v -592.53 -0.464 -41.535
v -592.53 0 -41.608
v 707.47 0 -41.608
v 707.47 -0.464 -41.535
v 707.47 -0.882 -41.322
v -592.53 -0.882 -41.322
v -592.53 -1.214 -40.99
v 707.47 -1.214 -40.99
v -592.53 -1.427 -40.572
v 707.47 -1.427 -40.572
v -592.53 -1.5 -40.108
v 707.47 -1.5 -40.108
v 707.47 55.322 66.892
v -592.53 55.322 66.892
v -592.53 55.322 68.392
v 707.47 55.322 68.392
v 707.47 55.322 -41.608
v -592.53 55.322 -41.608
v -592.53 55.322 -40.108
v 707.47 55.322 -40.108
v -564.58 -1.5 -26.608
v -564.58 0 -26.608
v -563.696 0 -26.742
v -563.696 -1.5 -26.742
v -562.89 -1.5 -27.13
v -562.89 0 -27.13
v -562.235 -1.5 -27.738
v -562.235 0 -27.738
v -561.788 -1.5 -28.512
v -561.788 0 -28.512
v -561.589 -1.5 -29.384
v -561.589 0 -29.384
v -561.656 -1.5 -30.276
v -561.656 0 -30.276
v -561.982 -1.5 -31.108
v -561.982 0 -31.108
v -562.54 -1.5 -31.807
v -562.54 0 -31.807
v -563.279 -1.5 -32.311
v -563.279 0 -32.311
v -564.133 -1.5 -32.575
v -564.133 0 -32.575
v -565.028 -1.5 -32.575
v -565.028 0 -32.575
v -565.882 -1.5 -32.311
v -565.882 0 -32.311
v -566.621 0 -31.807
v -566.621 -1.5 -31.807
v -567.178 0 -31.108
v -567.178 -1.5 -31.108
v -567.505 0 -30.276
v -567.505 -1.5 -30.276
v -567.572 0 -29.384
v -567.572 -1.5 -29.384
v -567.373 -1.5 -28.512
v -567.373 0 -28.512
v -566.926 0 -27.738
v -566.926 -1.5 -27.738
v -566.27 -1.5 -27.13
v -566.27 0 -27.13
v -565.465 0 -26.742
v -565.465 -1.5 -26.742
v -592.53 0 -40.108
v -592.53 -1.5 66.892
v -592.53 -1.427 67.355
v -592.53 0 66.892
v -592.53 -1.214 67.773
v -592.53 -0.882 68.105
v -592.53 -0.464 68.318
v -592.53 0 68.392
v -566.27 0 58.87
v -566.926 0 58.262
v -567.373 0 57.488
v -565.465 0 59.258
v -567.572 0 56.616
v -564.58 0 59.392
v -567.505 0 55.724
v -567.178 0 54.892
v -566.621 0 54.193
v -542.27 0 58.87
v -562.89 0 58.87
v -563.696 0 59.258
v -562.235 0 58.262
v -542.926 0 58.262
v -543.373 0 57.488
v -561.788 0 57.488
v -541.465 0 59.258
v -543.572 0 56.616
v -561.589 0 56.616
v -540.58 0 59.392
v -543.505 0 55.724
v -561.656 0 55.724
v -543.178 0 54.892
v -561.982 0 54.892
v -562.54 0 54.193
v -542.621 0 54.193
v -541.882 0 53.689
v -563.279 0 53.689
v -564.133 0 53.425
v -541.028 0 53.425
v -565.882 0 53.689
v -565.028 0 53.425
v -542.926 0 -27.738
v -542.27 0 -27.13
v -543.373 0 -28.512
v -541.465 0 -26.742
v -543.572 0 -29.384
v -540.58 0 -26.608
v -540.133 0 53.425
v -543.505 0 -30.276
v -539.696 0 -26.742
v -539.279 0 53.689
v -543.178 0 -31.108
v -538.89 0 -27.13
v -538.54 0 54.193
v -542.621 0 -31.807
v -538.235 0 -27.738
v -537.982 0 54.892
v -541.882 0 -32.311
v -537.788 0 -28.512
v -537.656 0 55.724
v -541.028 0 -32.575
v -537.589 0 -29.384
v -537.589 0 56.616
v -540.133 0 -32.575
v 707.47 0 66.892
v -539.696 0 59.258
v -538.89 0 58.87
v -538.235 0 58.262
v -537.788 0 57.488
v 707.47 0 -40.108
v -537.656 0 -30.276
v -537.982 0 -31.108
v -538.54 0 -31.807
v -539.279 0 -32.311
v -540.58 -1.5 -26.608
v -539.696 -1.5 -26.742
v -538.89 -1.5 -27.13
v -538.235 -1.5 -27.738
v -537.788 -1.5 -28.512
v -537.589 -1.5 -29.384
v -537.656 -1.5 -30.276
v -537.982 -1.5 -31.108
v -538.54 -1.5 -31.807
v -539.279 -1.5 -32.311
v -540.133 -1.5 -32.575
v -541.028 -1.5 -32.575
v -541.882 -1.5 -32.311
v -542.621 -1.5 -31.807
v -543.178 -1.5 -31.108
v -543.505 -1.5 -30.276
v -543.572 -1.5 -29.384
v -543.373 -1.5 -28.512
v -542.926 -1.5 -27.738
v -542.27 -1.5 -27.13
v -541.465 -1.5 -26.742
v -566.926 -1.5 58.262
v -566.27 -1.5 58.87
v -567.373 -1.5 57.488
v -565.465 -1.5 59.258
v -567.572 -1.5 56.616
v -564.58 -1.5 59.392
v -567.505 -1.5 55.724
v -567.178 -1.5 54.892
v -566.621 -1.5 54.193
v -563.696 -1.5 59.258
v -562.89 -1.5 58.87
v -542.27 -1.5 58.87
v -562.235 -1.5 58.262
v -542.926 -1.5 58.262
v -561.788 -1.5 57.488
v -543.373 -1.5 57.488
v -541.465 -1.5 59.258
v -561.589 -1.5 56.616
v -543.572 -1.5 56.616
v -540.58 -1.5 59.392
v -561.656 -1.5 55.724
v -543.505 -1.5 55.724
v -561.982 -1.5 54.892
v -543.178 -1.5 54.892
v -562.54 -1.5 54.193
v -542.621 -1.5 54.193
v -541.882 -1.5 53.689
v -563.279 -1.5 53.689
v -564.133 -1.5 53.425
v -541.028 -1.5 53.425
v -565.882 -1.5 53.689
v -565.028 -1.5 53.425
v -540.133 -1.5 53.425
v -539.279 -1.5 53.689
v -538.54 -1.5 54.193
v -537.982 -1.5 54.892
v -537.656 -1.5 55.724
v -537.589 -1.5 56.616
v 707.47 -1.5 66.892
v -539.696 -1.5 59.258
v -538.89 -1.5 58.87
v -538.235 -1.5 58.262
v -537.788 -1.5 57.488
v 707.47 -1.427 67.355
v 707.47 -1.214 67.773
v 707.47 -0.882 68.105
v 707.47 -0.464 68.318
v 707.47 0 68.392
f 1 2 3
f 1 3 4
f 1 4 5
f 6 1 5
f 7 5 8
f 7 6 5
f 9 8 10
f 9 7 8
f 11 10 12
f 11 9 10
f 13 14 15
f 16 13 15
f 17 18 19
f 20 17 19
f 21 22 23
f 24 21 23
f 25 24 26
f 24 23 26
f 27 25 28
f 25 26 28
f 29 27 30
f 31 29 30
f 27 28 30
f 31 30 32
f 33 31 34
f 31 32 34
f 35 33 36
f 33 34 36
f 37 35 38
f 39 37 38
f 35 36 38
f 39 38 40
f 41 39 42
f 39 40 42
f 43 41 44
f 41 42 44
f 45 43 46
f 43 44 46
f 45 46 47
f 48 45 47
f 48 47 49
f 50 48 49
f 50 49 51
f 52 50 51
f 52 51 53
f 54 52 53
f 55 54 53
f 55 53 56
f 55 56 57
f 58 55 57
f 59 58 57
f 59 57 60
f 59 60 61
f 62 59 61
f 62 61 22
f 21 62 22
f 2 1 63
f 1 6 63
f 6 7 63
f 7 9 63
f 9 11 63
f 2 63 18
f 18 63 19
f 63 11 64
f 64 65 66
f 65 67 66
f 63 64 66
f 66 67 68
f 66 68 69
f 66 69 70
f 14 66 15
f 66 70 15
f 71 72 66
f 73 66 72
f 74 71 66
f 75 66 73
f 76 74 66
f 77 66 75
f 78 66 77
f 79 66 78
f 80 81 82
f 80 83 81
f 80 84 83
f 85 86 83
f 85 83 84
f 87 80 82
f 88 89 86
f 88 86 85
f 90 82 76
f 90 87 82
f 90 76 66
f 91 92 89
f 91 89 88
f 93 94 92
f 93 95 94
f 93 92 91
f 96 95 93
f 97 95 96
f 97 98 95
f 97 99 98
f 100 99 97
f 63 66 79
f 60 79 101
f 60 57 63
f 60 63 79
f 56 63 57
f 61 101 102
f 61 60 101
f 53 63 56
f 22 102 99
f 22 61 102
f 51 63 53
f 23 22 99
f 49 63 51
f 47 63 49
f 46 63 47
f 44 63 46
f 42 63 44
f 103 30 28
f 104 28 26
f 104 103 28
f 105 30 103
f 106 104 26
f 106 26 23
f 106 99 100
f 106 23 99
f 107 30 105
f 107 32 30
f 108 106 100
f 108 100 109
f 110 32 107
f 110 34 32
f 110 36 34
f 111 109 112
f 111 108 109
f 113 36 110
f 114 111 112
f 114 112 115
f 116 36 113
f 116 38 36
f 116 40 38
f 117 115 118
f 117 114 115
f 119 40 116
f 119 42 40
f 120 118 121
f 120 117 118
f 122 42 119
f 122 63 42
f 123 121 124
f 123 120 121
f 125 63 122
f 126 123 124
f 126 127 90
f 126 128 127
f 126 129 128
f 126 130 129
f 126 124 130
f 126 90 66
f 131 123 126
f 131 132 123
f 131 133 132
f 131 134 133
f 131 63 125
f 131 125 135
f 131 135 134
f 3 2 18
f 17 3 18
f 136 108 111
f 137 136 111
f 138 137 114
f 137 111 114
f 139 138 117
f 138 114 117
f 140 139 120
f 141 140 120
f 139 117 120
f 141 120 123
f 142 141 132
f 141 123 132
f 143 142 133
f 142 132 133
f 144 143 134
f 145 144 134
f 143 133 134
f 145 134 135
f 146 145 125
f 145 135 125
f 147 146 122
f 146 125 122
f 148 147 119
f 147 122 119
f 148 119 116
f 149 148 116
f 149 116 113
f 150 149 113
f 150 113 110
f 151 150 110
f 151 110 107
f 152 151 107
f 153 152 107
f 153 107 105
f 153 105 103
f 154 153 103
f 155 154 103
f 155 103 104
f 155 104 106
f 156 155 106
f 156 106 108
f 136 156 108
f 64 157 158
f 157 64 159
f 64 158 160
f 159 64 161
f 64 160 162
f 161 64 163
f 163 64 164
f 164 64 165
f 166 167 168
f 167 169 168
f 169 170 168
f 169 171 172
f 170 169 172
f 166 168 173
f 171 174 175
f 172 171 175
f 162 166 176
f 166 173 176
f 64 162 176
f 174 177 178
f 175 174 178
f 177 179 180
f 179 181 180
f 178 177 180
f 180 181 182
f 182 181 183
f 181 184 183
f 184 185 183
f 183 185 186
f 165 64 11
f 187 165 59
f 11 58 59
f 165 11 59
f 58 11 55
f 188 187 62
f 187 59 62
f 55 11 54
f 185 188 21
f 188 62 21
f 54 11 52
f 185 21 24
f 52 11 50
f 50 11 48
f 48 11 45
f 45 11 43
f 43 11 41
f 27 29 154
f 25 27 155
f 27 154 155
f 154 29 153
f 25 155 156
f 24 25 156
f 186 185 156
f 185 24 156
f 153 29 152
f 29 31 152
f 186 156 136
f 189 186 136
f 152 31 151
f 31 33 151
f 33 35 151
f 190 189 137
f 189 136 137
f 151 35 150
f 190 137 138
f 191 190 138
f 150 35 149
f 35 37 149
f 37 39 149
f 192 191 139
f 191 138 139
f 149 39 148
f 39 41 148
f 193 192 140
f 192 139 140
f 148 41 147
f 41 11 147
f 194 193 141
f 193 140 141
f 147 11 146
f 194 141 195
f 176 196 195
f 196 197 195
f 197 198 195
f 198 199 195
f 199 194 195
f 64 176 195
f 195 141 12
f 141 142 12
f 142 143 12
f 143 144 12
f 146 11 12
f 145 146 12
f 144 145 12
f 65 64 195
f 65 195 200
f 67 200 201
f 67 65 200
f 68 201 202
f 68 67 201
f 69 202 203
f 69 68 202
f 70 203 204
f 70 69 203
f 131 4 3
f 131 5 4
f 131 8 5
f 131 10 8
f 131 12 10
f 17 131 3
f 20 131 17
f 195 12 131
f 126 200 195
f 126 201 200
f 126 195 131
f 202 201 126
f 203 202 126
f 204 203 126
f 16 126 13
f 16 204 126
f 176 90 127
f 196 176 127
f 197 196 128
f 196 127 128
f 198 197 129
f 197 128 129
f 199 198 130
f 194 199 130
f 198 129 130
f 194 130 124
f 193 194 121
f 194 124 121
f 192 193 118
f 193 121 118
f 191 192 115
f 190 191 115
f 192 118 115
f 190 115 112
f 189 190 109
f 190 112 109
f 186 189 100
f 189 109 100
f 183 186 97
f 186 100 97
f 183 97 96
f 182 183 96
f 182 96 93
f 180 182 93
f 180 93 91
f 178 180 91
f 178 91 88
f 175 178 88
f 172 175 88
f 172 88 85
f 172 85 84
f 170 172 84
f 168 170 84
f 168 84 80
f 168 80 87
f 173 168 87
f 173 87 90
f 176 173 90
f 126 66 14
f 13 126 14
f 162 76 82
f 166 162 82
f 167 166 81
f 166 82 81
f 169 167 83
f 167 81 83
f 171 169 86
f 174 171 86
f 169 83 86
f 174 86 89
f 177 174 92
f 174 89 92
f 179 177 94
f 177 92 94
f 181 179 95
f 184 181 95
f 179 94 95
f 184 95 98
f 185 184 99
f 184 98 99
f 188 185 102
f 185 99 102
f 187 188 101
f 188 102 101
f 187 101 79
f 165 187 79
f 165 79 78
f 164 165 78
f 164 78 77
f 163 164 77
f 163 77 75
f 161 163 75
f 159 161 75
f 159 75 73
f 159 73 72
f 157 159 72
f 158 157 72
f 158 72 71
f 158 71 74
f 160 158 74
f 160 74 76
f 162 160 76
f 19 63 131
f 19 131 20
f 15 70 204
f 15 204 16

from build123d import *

# Parameters (mm, degrees)
CROQUIS1_W                      = 1300
CROQUIS1_H                      = 220
BRIDA_BASE1_DEPTH               = 1.5
PLIEGUE_START                   = -592.530487805
PLIEGUE_CROQUIZADO1_DEPTH       = 1300
PLIEGUE_CROQUIZADO1_2_OUTLINE_W = 55.321902755
PLIEGUE_CROQUIZADO1_2_OUTLINE_H = 1.5
PLIEGUE_CROQUIZADO1_2_DEPTH     = 1300
CROQUIS8_R                      = 3
CORTAR_EXTRUIR1_DEPTH           = 10


# Read off the part's stored shape, not the designer's step: Pliegue croquizado1
# Sheet-metal steps are written as plain solids
with BuildPart() as part:
    # Croquis1 → Brida base1 (new body)
    with BuildSketch(Plane(origin=(0, 0, 0), x_dir=(1, 0, 0), z_dir=(0, 1, 0))):
        with Locations((57.469512195, -13.391768293)):
            Rectangle(CROQUIS1_W, CROQUIS1_H)
    extrude(amount=-BRIDA_BASE1_DEPTH)

    # Pliegue croquizado1 outline → Pliegue croquizado1 (cut)
    with BuildSketch(Plane.YZ.offset(PLIEGUE_START)):
        with BuildLine():
            Line((0, -96.608231707), (0, -41.608231707))
            ThreePointArc((0, -41.608231707), (-1.060660172, -41.168891879), (-1.5, -40.108231707))
            Line((-1.5, -40.108231707), (-1.5, -96.608231707))
            Line((-1.5, -96.608231707), (0, -96.608231707))
        make_face()
        with BuildLine():
            Line((-1.5, 123.391768293), (-1.5, 66.891768293))
            ThreePointArc((-1.5, 66.891768293), (-1.060660171, 67.952428465), (0, 68.391768293))
            Line((0, 68.391768293), (0, 123.391768293))
            Line((0, 123.391768293), (-1.5, 123.391768293))
        make_face()
    extrude(amount=PLIEGUE_CROQUIZADO1_DEPTH, mode=Mode.SUBTRACT)

    # Pliegue croquizado1 2 outline → Pliegue croquizado1 2 (add)
    with BuildSketch(Plane.YZ.offset(PLIEGUE_START)):
        with Locations((27.660951378, -40.858231707)):
            Rectangle(PLIEGUE_CROQUIZADO1_2_OUTLINE_W, PLIEGUE_CROQUIZADO1_2_OUTLINE_H)
        with Locations((27.660951378, 67.641768293)):
            Rectangle(PLIEGUE_CROQUIZADO1_2_OUTLINE_W, PLIEGUE_CROQUIZADO1_2_OUTLINE_H)
    extrude(amount=PLIEGUE_CROQUIZADO1_2_DEPTH)

    # Croquis8 → Cortar-Extruir1 (cut)
    with BuildSketch(Plane(origin=(0, 0, 0), x_dir=(1, 0, 0), z_dir=(0, 1, 0))):
        with Locations(Location((-564.580402517, -56.391768293, 0), (0, 0, 270))):
            Circle(CROQUIS8_R)
        with Locations(Location((-540.580402517, -56.391768293, 0), (0, 0, 270))):
            Circle(CROQUIS8_R)
        with Locations(Location((-540.580402517, 29.608231707, 0), (0, 0, 270))):
            Circle(CROQUIS8_R)
        with Locations(Location((-564.580402517, 29.608231707, 0), (0, 0, 270))):
            Circle(CROQUIS8_R)
    extrude(amount=-CORTAR_EXTRUIR1_DEPTH, mode=Mode.SUBTRACT)


solid = part.part
